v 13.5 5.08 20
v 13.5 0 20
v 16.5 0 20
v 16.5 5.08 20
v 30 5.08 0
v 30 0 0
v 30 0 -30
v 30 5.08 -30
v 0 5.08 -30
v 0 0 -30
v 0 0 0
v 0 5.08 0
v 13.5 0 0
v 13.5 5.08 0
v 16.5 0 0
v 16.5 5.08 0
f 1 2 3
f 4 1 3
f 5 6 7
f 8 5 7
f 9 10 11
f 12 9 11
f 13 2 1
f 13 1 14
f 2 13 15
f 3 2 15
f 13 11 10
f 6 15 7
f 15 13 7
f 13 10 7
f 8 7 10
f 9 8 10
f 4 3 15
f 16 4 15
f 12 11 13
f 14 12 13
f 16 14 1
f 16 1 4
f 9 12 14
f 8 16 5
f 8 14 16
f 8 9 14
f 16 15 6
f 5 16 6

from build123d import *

# Parameters (mm, degrees)
SKETCH1_W           = 3
SKETCH1_H           = 20
BOSS_EXTRUDE1_DEPTH = 5.08


with BuildPart() as part:
    # Sketch1 → Boss-Extrude1 (new body)
    with BuildSketch(Plane(origin=(0, 0, 0), x_dir=(1, 0, 0), z_dir=(0, 1, 0))):
        Polygon((13.5, 0), (16.5, 0), (30, 0), (30, 30), (0, 30), (0, 0), align=None)
        with Locations((15, -10)):
            Rectangle(SKETCH1_W, SKETCH1_H)
    extrude(amount=BOSS_EXTRUDE1_DEPTH)


solid = part.part
